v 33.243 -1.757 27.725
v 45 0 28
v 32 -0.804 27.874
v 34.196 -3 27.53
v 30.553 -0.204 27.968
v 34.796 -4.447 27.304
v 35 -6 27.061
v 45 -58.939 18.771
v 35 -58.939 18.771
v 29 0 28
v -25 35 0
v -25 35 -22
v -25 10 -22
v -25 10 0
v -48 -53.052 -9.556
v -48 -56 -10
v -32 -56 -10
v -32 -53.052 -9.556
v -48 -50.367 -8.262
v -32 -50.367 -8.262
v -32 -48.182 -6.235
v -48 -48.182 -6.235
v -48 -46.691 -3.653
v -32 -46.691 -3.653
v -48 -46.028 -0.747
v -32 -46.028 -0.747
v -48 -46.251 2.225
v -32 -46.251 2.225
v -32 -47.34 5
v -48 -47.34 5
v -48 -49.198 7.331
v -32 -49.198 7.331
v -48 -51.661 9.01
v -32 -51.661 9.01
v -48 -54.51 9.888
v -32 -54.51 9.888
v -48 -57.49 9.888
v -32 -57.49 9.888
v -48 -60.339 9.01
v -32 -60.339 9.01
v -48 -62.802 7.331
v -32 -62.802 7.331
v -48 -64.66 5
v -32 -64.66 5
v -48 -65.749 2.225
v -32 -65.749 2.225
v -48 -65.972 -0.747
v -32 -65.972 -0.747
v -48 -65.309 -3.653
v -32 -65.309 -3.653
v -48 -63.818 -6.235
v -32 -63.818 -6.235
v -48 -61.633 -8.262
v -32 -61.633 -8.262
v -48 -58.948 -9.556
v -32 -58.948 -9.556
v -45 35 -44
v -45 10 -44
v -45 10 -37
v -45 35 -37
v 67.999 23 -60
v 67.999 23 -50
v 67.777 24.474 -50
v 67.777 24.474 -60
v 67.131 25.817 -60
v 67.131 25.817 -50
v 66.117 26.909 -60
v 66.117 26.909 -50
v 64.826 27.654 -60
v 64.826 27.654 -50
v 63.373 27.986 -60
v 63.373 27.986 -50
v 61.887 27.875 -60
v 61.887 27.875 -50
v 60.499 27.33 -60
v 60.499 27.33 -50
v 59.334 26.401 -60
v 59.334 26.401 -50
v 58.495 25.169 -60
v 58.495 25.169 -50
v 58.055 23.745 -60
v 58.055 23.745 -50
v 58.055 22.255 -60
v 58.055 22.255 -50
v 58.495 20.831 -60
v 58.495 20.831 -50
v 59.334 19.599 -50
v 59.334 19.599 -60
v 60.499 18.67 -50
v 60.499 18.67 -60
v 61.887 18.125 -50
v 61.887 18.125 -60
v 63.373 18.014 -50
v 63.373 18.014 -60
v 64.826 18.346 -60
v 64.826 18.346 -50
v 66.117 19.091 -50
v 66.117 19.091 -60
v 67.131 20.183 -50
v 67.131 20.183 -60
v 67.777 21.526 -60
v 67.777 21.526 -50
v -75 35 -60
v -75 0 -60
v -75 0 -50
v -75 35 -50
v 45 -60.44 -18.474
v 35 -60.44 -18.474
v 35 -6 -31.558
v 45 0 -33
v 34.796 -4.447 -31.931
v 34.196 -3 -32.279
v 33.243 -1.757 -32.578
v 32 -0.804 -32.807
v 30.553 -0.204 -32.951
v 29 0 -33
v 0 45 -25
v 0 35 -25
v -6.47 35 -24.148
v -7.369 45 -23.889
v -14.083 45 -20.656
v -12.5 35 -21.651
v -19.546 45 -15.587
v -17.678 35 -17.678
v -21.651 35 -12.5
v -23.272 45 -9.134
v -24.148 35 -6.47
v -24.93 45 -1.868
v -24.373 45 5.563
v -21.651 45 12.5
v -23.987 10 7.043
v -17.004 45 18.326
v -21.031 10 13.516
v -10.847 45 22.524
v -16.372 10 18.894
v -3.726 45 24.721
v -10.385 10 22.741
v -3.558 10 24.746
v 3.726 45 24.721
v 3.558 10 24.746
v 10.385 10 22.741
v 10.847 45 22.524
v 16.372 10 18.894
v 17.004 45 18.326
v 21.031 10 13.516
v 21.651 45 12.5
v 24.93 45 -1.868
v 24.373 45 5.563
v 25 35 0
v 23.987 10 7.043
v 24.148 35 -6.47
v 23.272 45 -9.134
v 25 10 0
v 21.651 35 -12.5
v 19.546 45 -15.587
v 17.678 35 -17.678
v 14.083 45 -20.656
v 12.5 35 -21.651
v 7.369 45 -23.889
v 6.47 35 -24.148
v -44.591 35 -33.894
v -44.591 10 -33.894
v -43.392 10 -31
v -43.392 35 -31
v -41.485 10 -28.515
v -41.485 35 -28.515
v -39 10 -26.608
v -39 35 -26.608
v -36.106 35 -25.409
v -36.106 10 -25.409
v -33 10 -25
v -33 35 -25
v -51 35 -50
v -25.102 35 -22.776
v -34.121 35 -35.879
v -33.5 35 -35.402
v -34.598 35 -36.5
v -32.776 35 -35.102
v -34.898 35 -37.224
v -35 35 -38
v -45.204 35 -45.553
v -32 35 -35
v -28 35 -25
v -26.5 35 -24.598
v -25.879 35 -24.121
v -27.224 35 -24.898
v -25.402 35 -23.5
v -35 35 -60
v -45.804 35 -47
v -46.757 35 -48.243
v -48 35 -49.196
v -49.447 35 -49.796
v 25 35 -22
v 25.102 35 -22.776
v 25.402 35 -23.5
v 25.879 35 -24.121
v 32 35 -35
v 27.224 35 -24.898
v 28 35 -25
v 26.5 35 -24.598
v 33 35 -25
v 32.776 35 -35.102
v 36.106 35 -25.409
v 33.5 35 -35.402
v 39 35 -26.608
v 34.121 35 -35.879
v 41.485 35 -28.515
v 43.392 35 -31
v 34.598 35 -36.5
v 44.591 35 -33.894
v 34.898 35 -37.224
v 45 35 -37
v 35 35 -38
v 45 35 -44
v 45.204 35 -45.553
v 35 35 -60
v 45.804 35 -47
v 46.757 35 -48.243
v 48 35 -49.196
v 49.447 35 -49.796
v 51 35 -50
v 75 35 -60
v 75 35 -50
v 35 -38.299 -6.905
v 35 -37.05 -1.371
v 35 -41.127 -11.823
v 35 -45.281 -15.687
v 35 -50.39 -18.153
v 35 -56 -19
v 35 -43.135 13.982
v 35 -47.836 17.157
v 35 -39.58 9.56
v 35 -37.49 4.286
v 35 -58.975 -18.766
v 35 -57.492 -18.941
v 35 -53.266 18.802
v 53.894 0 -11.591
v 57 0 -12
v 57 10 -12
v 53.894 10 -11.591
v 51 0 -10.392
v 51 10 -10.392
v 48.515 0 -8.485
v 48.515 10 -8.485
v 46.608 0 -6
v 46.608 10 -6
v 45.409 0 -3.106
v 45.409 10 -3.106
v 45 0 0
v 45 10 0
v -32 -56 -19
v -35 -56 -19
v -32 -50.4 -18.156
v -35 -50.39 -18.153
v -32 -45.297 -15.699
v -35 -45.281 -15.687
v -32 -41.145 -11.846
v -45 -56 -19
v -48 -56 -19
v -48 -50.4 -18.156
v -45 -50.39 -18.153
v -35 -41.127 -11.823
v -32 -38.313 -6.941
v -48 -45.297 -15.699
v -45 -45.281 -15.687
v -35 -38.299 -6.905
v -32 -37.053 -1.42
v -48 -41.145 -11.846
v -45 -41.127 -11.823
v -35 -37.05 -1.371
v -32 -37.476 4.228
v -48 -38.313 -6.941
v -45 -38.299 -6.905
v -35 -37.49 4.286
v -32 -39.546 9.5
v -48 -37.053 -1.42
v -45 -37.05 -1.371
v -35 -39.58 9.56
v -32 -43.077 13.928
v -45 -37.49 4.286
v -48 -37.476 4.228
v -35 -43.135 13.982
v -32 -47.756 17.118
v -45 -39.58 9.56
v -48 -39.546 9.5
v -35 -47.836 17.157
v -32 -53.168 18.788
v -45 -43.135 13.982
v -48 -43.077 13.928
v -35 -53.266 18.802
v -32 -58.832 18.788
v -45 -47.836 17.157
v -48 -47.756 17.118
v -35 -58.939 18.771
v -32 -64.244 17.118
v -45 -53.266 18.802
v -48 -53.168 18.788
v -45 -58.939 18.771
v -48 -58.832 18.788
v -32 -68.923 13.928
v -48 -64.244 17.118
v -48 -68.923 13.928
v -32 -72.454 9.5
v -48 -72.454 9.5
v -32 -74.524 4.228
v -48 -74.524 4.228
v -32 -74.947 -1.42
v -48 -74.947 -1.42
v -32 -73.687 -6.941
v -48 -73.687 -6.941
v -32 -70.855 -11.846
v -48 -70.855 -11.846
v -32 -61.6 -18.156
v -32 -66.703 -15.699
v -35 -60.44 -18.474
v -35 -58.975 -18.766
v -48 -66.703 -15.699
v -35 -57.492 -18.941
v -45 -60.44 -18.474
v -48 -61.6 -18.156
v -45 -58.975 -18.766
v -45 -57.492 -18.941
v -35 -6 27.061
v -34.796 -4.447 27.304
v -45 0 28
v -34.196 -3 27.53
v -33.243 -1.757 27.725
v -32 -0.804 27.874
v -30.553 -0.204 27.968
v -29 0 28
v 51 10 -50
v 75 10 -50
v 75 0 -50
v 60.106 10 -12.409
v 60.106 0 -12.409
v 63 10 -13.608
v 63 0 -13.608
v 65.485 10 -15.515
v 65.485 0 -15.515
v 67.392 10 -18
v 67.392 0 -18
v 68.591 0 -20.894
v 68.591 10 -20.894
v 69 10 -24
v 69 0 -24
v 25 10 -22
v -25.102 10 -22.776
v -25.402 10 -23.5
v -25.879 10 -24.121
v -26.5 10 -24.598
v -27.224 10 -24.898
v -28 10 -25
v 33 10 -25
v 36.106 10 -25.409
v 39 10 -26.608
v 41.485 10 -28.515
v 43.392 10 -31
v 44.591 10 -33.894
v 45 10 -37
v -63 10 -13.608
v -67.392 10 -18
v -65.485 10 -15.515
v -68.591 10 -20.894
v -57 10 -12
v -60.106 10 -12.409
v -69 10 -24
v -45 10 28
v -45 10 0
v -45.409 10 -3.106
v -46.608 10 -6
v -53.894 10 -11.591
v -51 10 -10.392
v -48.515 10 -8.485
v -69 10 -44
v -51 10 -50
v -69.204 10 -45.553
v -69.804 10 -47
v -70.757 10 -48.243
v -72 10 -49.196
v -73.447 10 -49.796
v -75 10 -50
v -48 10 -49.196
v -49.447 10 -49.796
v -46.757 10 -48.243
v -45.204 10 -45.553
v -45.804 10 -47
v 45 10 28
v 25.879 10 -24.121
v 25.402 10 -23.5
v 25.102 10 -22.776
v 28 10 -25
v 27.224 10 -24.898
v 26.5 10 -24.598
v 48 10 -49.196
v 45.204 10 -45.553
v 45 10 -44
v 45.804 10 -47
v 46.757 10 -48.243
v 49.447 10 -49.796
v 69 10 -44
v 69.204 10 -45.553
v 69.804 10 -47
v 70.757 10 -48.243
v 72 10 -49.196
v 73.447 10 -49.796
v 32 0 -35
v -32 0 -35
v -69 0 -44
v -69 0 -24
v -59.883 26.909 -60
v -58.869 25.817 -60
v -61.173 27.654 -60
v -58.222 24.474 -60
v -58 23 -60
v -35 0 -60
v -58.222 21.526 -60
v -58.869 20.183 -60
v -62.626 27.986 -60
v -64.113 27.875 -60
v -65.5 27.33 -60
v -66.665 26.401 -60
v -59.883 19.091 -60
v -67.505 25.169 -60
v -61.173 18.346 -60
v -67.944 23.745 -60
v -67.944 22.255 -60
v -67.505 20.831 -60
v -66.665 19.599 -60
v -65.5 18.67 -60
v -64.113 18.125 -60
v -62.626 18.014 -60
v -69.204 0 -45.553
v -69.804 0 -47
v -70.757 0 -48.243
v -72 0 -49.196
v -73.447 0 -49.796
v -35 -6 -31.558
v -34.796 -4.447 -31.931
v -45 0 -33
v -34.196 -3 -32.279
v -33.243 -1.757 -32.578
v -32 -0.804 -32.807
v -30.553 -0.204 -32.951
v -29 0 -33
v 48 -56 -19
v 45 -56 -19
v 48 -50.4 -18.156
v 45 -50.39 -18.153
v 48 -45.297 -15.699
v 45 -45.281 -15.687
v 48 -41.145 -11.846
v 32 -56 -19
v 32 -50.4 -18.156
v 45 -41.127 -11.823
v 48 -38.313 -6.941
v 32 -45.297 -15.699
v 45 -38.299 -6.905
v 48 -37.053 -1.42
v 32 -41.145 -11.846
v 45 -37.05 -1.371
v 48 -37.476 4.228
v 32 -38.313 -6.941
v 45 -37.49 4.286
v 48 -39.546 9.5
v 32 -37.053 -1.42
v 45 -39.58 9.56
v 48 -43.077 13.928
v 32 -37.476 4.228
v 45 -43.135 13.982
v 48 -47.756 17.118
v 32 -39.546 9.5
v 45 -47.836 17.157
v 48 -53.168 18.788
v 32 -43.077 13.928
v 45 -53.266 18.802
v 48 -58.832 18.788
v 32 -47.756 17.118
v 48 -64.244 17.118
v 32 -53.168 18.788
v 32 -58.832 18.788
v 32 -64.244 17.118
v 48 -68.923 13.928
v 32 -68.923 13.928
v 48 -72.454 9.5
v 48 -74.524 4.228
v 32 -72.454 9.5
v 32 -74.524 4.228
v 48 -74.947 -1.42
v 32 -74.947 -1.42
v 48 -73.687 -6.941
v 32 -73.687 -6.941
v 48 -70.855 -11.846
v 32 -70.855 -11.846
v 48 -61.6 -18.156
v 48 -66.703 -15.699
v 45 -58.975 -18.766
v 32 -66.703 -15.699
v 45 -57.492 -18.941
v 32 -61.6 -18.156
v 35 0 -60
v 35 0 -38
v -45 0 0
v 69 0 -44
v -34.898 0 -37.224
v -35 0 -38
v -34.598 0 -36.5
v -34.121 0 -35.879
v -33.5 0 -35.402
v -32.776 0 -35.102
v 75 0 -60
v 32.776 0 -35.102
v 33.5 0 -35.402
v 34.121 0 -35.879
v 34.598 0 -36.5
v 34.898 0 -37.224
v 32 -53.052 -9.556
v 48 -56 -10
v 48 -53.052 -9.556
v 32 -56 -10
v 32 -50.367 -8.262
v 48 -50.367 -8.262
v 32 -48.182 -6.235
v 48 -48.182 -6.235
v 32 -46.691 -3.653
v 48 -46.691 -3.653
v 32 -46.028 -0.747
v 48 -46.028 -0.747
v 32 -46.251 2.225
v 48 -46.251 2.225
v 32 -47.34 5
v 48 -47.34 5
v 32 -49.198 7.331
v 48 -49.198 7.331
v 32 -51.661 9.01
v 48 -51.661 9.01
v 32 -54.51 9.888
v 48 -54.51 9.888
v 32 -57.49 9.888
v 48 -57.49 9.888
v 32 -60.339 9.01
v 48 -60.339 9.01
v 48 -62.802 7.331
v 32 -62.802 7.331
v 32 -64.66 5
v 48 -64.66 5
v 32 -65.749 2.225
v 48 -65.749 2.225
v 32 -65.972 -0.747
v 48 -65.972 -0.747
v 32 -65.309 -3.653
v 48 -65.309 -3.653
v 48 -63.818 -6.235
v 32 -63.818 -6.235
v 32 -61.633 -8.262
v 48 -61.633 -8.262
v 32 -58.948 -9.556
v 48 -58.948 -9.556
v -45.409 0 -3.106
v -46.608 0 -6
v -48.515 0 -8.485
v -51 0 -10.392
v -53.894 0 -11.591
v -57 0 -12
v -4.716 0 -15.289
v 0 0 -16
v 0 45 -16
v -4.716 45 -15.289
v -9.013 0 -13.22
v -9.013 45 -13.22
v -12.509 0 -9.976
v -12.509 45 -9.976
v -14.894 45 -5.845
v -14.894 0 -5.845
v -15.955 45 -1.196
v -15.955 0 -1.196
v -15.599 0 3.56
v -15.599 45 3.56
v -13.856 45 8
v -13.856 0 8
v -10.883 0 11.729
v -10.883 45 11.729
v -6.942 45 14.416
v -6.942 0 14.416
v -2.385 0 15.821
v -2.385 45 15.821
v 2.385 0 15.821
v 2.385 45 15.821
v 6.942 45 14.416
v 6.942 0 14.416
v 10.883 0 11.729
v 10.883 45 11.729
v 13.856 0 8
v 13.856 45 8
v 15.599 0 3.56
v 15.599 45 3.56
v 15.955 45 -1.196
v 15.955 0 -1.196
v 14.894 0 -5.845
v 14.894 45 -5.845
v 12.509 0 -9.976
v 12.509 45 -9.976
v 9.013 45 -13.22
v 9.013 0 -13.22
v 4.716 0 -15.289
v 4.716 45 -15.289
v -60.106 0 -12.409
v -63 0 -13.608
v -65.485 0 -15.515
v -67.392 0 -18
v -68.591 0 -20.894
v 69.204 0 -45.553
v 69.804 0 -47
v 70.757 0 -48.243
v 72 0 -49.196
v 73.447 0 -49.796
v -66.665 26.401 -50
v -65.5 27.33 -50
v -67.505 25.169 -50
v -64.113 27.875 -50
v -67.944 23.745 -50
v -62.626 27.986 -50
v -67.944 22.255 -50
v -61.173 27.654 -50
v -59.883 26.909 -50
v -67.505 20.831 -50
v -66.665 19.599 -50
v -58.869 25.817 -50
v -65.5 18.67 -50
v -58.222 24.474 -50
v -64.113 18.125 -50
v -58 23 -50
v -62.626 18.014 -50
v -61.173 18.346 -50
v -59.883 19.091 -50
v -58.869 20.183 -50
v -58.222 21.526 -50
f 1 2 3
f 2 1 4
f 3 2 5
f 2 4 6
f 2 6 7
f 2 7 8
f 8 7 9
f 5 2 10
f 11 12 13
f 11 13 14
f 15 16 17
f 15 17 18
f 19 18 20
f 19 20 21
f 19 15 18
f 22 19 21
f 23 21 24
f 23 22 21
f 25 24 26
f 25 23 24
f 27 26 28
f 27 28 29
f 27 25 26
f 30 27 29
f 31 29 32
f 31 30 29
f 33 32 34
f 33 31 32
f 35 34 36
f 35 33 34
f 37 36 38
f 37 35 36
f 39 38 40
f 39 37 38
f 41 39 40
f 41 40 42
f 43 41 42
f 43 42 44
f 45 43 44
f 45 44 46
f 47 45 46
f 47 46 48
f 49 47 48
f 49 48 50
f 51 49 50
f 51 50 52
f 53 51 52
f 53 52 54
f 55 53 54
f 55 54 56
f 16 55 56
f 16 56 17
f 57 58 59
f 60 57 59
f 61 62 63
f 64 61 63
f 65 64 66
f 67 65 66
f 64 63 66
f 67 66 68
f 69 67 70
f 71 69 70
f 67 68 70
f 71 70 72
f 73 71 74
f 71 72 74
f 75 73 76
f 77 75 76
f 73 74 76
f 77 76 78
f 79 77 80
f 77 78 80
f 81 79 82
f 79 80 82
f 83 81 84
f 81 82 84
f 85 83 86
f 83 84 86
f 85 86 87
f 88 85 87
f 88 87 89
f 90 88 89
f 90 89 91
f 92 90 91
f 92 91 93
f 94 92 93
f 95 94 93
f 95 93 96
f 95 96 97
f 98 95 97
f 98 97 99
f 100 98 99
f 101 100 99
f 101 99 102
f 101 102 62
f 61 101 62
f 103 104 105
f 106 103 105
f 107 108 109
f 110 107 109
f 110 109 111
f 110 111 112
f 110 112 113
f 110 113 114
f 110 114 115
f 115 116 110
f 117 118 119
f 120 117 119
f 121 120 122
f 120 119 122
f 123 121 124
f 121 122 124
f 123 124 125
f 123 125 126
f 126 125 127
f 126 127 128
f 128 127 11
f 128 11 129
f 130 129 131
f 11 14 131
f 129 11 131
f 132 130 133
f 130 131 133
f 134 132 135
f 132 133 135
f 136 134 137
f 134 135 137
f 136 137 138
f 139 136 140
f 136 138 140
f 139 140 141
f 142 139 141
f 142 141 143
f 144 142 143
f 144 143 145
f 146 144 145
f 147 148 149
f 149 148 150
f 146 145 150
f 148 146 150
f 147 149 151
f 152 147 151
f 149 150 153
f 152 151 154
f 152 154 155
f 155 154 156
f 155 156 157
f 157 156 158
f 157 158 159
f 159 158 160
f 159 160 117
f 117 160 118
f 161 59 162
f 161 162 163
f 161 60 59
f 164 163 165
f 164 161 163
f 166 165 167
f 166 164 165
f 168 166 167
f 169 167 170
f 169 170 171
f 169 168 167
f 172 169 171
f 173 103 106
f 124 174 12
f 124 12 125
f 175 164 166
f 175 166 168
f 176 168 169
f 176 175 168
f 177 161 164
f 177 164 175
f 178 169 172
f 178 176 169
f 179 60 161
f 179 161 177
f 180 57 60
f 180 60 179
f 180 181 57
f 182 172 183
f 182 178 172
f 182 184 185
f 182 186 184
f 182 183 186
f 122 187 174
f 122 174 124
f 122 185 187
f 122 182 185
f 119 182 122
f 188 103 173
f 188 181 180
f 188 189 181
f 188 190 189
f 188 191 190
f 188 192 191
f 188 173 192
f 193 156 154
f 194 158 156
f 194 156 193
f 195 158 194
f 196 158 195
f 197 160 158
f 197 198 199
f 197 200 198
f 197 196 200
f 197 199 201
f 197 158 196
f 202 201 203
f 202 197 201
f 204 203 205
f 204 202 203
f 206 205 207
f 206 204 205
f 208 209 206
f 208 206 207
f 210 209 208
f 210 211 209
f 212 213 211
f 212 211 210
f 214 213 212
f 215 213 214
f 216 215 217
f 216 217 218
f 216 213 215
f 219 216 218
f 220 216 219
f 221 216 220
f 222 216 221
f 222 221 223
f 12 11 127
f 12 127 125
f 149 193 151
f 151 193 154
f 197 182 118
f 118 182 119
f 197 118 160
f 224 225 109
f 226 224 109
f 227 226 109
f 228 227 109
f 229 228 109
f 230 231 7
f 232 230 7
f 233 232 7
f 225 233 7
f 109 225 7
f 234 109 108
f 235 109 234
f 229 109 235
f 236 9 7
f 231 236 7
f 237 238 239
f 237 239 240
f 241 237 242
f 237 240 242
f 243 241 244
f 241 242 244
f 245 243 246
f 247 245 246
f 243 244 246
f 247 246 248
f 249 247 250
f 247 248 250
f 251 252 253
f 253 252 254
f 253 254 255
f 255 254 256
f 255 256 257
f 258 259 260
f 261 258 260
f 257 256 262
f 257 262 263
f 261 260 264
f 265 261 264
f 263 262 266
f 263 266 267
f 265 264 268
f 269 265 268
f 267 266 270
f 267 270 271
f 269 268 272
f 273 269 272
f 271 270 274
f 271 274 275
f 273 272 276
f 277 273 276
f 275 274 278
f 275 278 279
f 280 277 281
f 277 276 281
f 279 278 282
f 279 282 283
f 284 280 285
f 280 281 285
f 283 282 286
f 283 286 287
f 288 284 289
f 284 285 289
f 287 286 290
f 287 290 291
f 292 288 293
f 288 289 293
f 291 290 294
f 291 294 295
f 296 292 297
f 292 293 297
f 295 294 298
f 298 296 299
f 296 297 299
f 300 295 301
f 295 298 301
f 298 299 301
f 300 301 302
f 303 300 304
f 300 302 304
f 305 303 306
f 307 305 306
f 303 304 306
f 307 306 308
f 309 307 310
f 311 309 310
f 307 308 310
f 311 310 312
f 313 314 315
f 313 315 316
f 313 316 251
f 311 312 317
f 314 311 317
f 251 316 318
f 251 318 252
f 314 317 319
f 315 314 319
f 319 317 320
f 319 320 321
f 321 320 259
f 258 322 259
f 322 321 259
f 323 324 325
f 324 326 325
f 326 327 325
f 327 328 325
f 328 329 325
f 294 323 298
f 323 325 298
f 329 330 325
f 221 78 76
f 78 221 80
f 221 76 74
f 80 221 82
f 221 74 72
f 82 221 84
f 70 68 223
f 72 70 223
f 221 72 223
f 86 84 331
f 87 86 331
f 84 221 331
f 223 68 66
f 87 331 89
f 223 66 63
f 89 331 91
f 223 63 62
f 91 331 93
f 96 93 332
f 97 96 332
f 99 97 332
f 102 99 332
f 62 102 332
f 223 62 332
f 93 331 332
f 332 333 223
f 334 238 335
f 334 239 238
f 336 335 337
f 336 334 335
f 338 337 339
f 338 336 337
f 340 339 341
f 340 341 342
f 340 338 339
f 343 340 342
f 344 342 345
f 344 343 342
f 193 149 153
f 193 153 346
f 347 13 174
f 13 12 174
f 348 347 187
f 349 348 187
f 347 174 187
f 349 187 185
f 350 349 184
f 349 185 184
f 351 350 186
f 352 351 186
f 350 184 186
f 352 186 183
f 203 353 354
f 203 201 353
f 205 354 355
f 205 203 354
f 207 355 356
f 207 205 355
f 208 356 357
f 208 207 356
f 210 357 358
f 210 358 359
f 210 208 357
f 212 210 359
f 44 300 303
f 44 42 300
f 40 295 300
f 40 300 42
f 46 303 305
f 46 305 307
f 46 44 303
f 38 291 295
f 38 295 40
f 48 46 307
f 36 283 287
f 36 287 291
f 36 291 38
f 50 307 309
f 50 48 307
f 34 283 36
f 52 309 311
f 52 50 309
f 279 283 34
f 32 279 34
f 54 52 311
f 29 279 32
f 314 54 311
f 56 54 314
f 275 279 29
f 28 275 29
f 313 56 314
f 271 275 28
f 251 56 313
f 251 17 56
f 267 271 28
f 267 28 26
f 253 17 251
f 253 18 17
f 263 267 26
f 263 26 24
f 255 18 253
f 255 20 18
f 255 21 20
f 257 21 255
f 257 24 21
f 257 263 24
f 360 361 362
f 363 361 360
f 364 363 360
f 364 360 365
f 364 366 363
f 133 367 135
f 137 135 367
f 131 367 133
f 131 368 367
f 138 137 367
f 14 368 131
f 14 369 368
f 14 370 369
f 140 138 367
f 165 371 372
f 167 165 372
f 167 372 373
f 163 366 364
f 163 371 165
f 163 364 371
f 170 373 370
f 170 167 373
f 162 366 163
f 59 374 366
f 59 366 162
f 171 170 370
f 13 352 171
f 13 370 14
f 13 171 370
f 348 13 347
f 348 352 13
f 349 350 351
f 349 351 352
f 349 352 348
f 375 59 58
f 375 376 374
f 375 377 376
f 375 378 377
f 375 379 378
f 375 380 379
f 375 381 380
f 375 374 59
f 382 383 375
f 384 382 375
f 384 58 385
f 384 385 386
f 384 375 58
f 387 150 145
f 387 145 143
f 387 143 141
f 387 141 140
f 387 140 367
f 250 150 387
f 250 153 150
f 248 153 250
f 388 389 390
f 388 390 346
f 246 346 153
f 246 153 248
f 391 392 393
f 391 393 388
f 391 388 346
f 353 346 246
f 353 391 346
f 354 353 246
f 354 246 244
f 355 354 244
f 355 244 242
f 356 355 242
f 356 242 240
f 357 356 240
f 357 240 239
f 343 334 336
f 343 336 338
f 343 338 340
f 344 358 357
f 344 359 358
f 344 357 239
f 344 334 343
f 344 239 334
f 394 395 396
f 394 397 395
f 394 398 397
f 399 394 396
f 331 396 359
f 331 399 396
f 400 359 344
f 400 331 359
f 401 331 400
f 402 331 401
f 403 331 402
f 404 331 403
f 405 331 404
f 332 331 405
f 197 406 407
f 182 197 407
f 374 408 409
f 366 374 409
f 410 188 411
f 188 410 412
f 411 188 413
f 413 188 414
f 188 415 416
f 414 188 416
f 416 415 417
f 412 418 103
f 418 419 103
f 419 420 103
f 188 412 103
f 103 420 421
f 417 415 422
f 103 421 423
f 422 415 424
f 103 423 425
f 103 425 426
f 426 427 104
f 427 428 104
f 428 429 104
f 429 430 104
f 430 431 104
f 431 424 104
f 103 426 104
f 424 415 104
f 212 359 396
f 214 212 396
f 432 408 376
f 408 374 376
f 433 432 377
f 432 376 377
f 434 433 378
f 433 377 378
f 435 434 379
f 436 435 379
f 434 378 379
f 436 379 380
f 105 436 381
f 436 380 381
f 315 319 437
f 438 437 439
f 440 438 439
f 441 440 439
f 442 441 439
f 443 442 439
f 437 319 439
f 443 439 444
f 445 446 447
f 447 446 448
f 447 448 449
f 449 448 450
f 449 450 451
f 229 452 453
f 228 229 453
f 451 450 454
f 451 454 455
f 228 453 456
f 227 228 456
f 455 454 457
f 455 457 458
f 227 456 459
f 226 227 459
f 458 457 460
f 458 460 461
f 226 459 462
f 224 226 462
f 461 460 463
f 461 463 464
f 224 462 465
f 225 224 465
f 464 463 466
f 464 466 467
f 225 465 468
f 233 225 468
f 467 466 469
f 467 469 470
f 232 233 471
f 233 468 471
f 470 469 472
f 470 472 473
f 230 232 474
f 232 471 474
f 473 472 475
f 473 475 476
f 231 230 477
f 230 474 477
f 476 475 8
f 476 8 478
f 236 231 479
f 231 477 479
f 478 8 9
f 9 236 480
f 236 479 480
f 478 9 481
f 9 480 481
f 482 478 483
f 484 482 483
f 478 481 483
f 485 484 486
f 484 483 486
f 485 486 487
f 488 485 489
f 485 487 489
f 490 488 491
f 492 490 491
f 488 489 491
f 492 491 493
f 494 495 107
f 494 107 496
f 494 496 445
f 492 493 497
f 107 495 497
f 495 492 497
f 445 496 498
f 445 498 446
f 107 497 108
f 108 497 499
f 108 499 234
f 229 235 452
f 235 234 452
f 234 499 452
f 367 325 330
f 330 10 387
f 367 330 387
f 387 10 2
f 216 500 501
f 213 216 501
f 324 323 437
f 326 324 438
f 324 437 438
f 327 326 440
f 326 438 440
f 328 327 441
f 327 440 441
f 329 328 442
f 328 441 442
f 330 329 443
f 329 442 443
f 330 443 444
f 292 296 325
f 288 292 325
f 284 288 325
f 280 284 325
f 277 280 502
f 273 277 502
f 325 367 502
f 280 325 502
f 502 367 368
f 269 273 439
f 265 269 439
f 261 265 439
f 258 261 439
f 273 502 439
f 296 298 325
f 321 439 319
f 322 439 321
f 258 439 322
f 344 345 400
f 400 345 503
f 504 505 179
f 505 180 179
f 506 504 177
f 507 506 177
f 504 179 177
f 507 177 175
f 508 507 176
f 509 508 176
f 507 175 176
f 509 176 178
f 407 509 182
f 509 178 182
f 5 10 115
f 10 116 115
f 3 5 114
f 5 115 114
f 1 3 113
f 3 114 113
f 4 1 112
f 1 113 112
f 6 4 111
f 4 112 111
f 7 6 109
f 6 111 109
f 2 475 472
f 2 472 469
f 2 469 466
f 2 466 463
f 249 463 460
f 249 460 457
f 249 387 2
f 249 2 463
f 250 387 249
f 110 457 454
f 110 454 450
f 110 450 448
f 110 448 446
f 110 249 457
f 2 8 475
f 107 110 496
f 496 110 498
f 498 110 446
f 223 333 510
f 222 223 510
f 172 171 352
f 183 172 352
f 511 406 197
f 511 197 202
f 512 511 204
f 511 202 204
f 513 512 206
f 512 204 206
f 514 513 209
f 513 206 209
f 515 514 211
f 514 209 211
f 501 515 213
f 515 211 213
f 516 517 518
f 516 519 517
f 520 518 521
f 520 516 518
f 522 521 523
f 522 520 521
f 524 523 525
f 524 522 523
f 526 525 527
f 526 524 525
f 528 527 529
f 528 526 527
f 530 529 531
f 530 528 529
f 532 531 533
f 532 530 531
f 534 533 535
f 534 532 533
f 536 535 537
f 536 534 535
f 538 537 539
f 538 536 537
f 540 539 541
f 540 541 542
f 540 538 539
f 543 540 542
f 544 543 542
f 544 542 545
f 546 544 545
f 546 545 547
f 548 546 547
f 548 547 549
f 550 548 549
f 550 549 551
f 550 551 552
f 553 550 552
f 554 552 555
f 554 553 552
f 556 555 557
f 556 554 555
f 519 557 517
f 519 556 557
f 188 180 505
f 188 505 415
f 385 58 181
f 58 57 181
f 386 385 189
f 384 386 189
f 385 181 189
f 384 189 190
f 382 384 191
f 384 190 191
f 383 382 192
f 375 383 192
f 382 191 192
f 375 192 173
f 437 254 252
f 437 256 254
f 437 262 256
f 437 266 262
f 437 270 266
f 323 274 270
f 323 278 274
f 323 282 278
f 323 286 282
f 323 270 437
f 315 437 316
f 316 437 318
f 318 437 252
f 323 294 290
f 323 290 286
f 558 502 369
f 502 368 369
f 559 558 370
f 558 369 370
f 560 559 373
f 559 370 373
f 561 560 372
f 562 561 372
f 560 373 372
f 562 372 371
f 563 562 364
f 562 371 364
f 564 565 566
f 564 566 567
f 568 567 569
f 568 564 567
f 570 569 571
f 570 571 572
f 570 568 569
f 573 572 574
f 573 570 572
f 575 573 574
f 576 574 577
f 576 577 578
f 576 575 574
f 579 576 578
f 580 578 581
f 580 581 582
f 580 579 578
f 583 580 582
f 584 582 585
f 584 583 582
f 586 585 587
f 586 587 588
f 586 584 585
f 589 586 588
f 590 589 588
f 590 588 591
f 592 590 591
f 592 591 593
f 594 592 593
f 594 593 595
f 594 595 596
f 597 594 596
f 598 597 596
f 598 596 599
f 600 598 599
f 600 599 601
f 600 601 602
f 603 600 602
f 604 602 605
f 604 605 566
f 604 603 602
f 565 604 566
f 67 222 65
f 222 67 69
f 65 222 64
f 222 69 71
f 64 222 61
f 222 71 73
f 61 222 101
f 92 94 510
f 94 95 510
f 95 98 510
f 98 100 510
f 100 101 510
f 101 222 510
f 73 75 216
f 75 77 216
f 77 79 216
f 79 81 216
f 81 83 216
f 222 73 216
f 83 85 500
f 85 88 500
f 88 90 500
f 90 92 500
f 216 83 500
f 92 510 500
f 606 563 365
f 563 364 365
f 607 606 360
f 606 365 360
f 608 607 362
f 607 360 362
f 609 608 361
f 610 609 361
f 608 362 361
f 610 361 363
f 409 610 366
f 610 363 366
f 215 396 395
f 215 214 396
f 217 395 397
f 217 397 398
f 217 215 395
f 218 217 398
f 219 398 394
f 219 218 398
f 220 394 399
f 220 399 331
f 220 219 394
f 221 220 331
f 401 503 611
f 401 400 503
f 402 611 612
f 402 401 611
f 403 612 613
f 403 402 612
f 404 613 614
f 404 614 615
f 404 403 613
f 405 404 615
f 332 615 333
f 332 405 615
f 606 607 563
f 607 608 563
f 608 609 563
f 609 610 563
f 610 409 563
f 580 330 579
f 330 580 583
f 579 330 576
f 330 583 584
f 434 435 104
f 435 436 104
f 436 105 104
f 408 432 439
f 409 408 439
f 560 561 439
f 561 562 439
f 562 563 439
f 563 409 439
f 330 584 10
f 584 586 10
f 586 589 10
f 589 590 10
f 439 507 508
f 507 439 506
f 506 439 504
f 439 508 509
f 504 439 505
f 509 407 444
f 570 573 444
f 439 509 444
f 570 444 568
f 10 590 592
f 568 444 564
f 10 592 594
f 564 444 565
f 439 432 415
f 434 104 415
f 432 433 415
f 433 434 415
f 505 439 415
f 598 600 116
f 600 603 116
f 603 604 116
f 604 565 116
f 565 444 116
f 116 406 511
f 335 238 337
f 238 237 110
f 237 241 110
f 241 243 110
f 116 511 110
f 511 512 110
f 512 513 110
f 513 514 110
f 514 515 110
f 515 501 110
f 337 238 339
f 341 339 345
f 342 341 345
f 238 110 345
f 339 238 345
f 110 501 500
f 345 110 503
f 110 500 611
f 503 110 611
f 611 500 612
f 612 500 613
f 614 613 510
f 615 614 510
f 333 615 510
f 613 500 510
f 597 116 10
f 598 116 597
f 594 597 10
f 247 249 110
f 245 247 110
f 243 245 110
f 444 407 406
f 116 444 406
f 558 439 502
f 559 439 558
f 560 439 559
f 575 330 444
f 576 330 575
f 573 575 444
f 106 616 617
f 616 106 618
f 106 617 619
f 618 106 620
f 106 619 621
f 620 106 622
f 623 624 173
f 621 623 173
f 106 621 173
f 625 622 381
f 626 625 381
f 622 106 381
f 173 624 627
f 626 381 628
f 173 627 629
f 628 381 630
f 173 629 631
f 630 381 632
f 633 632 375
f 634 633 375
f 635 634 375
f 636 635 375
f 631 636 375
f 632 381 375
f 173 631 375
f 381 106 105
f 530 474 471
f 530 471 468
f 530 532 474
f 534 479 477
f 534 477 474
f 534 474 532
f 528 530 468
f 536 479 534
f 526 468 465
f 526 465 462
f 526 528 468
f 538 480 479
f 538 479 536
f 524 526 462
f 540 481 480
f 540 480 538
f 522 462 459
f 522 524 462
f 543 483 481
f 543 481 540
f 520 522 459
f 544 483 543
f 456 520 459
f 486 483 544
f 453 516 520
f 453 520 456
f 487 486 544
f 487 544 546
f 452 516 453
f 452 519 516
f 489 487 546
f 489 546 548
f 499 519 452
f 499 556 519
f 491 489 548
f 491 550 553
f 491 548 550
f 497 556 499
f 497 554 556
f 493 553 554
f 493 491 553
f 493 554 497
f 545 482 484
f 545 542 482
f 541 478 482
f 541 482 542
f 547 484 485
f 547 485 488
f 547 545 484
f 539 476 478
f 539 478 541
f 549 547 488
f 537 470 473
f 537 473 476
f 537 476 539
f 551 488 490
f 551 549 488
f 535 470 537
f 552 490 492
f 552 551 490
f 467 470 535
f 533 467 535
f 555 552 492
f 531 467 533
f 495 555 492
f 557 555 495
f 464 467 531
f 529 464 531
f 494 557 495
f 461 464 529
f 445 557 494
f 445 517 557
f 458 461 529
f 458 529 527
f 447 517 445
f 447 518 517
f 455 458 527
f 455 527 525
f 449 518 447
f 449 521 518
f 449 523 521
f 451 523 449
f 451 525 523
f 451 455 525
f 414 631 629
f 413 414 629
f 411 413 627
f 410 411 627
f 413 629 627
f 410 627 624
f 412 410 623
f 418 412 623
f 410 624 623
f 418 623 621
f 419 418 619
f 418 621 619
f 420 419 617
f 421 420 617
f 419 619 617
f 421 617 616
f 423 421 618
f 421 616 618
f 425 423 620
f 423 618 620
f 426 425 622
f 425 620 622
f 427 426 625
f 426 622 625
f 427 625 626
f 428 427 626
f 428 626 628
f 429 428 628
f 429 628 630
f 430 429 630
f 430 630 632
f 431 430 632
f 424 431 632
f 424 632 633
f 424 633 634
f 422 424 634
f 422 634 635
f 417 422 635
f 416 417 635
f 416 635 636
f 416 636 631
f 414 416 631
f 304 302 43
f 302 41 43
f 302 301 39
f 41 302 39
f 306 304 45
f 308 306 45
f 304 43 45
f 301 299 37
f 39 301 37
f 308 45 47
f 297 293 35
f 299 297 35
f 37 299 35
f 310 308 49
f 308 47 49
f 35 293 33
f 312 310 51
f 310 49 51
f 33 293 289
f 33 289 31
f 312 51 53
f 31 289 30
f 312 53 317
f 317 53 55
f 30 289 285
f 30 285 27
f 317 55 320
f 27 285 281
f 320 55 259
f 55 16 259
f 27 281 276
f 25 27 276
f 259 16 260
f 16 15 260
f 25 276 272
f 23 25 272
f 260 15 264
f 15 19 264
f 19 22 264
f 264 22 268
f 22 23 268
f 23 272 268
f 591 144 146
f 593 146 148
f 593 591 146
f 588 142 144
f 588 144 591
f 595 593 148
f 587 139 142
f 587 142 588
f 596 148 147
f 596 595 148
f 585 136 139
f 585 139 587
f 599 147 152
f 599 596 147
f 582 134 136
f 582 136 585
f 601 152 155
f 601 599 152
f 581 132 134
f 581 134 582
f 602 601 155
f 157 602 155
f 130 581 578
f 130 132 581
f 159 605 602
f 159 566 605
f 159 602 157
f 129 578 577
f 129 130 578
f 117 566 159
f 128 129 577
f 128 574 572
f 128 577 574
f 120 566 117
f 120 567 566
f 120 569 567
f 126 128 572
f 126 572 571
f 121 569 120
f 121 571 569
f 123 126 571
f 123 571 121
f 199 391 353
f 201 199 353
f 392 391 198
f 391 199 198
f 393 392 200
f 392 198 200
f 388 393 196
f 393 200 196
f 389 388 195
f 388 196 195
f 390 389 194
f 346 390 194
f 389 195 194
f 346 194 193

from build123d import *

# Parameters (mm, degrees)
SKETCH1_R                = 25
SKETCH1_R_2              = 16
BOSS_EXTRUDE1_DEPTH      = 45
BOSS_EXTRUDE2_DEPTH      = 10
BOSS_EXTRUDE3_DEPTH      = 35
FILLET1_R                = 12
FILLET2_R                = 12
FILLET3_R                = 6
FILLET4_R                = 12
FILLET5_R                = 3
FILLET6_R                = 6
BOSS_EXTRUDE4_DEPTH      = 48
BOSS_EXTRUDE4_DEPTH_BACK = 48
SKETCH2_R                = 19
SKETCH2_R_2              = 10
BOSS_EXTRUDE5_DEPTH      = 45
BOSS_EXTRUDE5_DEPTH_BACK = 45
SKETCH3_W                = 70
SKETCH3_H                = 86.046908332
CUT_EXTRUDE1_DEPTH       = 138.818721515
FILLET7_R                = 6
SKETCH4_R                = 5
CUT_EXTRUDE2_DEPTH       = 132.658649545
SKETCH6_R                = 19
SKETCH6_R_2              = 10
BOSS_EXTRUDE7_DEPTH      = 16
SKETCH7_R                = 19
SKETCH7_R_2              = 10
BOSS_EXTRUDE8_DEPTH      = 16


with BuildPart() as part:
    # Sketch1 → Boss-Extrude1 (new body)
    with BuildSketch(Plane(origin=(0, 0, 0), x_dir=(1, 0, 0), z_dir=(0, 1, 0))):
        with Locations(Location((0, 0, 0), (0, 0, 90))):
            Circle(SKETCH1_R)
        with Locations(Location((0, 0, 0), (0, 0, 90))):
            Circle(SKETCH1_R_2, mode=Mode.SUBTRACT)
    extrude(amount=BOSS_EXTRUDE1_DEPTH)

    # Sketch1<3> → Boss-Extrude2 (add)
    with BuildSketch(Plane(origin=(0, 0, 0), x_dir=(1, 0, 0), z_dir=(0, 1, 0))):
        with BuildLine():
            Line((-45, 50), (-69, 50))
            Line((-69, 50), (-69, 12))
            Line((-69, 12), (-45, 12))
            Line((-45, 12), (-45, -28))
            Line((-45, -28), (45, -28))
            Line((45, -28), (45, 12))
            Line((45, 12), (69, 12))
            Line((69, 12), (69, 50))
            Line((69, 50), (45, 50))
            Line((45, 50), (45, 25))
            Line((45, 25), (25, 25))
            Line((25, 25), (25, 0))
            ThreePointArc((25, 0), (0, -25), (-25, 0))
            Line((-25, 0), (-25, 25))
            Line((-25, 25), (-45, 25))
            Line((-45, 25), (-45, 50))
        make_face()
    extrude(amount=BOSS_EXTRUDE2_DEPTH)

    # Sketch1<4> → Boss-Extrude3 (add)
    with BuildSketch(Plane(origin=(0, 0, 0), x_dir=(1, 0, 0), z_dir=(0, 1, 0))):
        with BuildLine():
            Line((-35, 35), (-35, 60))
            Line((-35, 60), (-75, 60))
            Line((-75, 60), (-75, 50))
            Line((-75, 50), (-69, 50))
            Line((-69, 50), (-45, 50))
            Line((-45, 50), (-45, 25))
            Line((-45, 25), (-25, 25))
            Line((-25, 25), (-25, 0))
            ThreePointArc((-25, 0), (0, 25), (25, 0))
            Line((25, 0), (25, 25))
            Line((25, 25), (45, 25))
            Line((45, 25), (45, 50))
            Line((45, 50), (69, 50))
            Line((69, 50), (75, 50))
            Line((75, 50), (75, 60))
            Line((75, 60), (35, 60))
            Line((35, 60), (35, 35))
            Line((35, 35), (-35, 35))
        make_face()
    extrude(amount=BOSS_EXTRUDE3_DEPTH)

    # Fillet1
    fillet1_edges = [part.edges().sort_by_distance(p)[0] for p in [
        (45, 22.5, -25),
        (-45, 22.5, -25),
    ]]
    fillet(fillet1_edges, radius=FILLET1_R)

    # Fillet2
    fillet2_edges = [part.edges().sort_by_distance(p)[0] for p in [
        (-45, 5, -12),
        (45, 5, -12),
    ]]
    fillet(fillet2_edges, radius=FILLET2_R)

    # Fillet3
    fillet3_edges = [part.edges().sort_by_distance(p)[0] for p in [
        (69, 5, -50),
        (-69, 5, -50),
    ]]
    fillet(fillet3_edges, radius=FILLET3_R - 0.0001)  # a hair under: the kernel refuses the full size

    # Fillet4
    fillet4_edges = [part.edges().sort_by_distance(p)[0] for p in [
        (69, 5, -12),
        (-69, 5, -12),
    ]]
    fillet(fillet4_edges, radius=FILLET4_R - 0.0001)  # a hair under: the kernel refuses the full size

    # Fillet5
    fillet5_edges = [part.edges().sort_by_distance(p)[0] for p in [
        (25, 22.5, -25),
        (35, 17.5, -35),
        (-35, 17.5, -35),
        (-25, 22.5, -25),
    ]]
    fillet(fillet5_edges, radius=FILLET5_R)

    # Fillet6
    fillet6_edges = [part.edges().sort_by_distance(p)[0] for p in [
        (45, 22.5, -50),
        (-45, 22.5, -50),
    ]]
    fillet(fillet6_edges, radius=FILLET6_R)



with BuildPart() as body_2:
    # Sketch2 → Boss-Extrude4 (new, two sides: drawn at the far end of the back side and taken through both)
    with BuildSketch(Plane(origin=(0, 0, 0), x_dir=(0, 0, -1), z_dir=(1, 0, 0)).offset(-BOSS_EXTRUDE4_DEPTH_BACK)):
        with Locations((0, -56)):
            Circle(SKETCH2_R)
        with Locations((0, -56)):
            Circle(SKETCH2_R_2, mode=Mode.SUBTRACT)
    extrude(amount=BOSS_EXTRUDE4_DEPTH + BOSS_EXTRUDE4_DEPTH_BACK)


with BuildPart() as part_1:
    add(part.part)

    add(body_2.part)  # Boss-Extrude5 merges body 2
    # Sketch2<4> → Boss-Extrude5 (add, two sides: drawn at the far end of the back side and taken through both)
    with BuildSketch(Plane(origin=(0, 0, 0), x_dir=(0, 0, -1), z_dir=(1, 0, 0)).offset(-BOSS_EXTRUDE5_DEPTH_BACK)):
        with BuildLine():
            Line((0, 0), (-28, 0))
            Line((-28, 0), (-18.771282059, -58.939212458))
            ThreePointArc((-18.771282059, -58.939212458), (-1.474048996, -37.057265785), (19, -56))
            ThreePointArc((19, -56), (18.868026287, -58.235527685), (18.473938523, -60.439999487))
            Line((18.473938523, -60.439999487), (33, 0))
            Line((33, 0), (24, 0))
            Line((24, 0), (12, 0))
            Line((12, 0), (0, 0))
        make_face()
    extrude(amount=BOSS_EXTRUDE5_DEPTH + BOSS_EXTRUDE5_DEPTH_BACK)

    # Sketch3 → Cut-Extrude1 (cut, through all)
    with BuildSketch(Plane.XY.offset(28)):
        with Locations((0, -43.023454166)):
            Rectangle(SKETCH3_W, SKETCH3_H)
    extrude(amount=-CUT_EXTRUDE1_DEPTH, mode=Mode.SUBTRACT)

    # Fillet7
    fillet7_edges = [part_1.edges().sort_by_distance(p)[0] for p in [
        (-35, 0, -2.5),
        (35, 0, -2.5),
    ]]
    fillet(fillet7_edges, radius=FILLET7_R)

    # Sketch4 → Cut-Extrude2 (cut, through all)
    with BuildSketch(Plane.XY.offset(-50)):
        with Locations((-63, 23)):
            Circle(SKETCH4_R)
        with Locations((62.999455964, 23)):
            Circle(SKETCH4_R)
    extrude(amount=-CUT_EXTRUDE2_DEPTH, mode=Mode.SUBTRACT)

    # Sketch6 → Boss-Extrude7 (add)
    with BuildSketch(Plane(origin=(-32, 0, 0), x_dir=(0, 0, -1), z_dir=(1, 0, 0))):
        with Locations((0, -56)):
            Circle(SKETCH6_R)
        with Locations((0, -56)):
            Circle(SKETCH6_R_2, mode=Mode.SUBTRACT)
    extrude(amount=-BOSS_EXTRUDE7_DEPTH)

    # Sketch7 → Boss-Extrude8 (add)
    with BuildSketch(Plane.ZY.offset(-32)):
        with Locations(Location((0, -56, 0), (0, 0, 180))):
            Circle(SKETCH7_R)
        with Locations(Location((0, -56, 0), (0, 0, 180))):
            Circle(SKETCH7_R_2, mode=Mode.SUBTRACT)
    extrude(amount=-BOSS_EXTRUDE8_DEPTH)


solid = part_1.part
